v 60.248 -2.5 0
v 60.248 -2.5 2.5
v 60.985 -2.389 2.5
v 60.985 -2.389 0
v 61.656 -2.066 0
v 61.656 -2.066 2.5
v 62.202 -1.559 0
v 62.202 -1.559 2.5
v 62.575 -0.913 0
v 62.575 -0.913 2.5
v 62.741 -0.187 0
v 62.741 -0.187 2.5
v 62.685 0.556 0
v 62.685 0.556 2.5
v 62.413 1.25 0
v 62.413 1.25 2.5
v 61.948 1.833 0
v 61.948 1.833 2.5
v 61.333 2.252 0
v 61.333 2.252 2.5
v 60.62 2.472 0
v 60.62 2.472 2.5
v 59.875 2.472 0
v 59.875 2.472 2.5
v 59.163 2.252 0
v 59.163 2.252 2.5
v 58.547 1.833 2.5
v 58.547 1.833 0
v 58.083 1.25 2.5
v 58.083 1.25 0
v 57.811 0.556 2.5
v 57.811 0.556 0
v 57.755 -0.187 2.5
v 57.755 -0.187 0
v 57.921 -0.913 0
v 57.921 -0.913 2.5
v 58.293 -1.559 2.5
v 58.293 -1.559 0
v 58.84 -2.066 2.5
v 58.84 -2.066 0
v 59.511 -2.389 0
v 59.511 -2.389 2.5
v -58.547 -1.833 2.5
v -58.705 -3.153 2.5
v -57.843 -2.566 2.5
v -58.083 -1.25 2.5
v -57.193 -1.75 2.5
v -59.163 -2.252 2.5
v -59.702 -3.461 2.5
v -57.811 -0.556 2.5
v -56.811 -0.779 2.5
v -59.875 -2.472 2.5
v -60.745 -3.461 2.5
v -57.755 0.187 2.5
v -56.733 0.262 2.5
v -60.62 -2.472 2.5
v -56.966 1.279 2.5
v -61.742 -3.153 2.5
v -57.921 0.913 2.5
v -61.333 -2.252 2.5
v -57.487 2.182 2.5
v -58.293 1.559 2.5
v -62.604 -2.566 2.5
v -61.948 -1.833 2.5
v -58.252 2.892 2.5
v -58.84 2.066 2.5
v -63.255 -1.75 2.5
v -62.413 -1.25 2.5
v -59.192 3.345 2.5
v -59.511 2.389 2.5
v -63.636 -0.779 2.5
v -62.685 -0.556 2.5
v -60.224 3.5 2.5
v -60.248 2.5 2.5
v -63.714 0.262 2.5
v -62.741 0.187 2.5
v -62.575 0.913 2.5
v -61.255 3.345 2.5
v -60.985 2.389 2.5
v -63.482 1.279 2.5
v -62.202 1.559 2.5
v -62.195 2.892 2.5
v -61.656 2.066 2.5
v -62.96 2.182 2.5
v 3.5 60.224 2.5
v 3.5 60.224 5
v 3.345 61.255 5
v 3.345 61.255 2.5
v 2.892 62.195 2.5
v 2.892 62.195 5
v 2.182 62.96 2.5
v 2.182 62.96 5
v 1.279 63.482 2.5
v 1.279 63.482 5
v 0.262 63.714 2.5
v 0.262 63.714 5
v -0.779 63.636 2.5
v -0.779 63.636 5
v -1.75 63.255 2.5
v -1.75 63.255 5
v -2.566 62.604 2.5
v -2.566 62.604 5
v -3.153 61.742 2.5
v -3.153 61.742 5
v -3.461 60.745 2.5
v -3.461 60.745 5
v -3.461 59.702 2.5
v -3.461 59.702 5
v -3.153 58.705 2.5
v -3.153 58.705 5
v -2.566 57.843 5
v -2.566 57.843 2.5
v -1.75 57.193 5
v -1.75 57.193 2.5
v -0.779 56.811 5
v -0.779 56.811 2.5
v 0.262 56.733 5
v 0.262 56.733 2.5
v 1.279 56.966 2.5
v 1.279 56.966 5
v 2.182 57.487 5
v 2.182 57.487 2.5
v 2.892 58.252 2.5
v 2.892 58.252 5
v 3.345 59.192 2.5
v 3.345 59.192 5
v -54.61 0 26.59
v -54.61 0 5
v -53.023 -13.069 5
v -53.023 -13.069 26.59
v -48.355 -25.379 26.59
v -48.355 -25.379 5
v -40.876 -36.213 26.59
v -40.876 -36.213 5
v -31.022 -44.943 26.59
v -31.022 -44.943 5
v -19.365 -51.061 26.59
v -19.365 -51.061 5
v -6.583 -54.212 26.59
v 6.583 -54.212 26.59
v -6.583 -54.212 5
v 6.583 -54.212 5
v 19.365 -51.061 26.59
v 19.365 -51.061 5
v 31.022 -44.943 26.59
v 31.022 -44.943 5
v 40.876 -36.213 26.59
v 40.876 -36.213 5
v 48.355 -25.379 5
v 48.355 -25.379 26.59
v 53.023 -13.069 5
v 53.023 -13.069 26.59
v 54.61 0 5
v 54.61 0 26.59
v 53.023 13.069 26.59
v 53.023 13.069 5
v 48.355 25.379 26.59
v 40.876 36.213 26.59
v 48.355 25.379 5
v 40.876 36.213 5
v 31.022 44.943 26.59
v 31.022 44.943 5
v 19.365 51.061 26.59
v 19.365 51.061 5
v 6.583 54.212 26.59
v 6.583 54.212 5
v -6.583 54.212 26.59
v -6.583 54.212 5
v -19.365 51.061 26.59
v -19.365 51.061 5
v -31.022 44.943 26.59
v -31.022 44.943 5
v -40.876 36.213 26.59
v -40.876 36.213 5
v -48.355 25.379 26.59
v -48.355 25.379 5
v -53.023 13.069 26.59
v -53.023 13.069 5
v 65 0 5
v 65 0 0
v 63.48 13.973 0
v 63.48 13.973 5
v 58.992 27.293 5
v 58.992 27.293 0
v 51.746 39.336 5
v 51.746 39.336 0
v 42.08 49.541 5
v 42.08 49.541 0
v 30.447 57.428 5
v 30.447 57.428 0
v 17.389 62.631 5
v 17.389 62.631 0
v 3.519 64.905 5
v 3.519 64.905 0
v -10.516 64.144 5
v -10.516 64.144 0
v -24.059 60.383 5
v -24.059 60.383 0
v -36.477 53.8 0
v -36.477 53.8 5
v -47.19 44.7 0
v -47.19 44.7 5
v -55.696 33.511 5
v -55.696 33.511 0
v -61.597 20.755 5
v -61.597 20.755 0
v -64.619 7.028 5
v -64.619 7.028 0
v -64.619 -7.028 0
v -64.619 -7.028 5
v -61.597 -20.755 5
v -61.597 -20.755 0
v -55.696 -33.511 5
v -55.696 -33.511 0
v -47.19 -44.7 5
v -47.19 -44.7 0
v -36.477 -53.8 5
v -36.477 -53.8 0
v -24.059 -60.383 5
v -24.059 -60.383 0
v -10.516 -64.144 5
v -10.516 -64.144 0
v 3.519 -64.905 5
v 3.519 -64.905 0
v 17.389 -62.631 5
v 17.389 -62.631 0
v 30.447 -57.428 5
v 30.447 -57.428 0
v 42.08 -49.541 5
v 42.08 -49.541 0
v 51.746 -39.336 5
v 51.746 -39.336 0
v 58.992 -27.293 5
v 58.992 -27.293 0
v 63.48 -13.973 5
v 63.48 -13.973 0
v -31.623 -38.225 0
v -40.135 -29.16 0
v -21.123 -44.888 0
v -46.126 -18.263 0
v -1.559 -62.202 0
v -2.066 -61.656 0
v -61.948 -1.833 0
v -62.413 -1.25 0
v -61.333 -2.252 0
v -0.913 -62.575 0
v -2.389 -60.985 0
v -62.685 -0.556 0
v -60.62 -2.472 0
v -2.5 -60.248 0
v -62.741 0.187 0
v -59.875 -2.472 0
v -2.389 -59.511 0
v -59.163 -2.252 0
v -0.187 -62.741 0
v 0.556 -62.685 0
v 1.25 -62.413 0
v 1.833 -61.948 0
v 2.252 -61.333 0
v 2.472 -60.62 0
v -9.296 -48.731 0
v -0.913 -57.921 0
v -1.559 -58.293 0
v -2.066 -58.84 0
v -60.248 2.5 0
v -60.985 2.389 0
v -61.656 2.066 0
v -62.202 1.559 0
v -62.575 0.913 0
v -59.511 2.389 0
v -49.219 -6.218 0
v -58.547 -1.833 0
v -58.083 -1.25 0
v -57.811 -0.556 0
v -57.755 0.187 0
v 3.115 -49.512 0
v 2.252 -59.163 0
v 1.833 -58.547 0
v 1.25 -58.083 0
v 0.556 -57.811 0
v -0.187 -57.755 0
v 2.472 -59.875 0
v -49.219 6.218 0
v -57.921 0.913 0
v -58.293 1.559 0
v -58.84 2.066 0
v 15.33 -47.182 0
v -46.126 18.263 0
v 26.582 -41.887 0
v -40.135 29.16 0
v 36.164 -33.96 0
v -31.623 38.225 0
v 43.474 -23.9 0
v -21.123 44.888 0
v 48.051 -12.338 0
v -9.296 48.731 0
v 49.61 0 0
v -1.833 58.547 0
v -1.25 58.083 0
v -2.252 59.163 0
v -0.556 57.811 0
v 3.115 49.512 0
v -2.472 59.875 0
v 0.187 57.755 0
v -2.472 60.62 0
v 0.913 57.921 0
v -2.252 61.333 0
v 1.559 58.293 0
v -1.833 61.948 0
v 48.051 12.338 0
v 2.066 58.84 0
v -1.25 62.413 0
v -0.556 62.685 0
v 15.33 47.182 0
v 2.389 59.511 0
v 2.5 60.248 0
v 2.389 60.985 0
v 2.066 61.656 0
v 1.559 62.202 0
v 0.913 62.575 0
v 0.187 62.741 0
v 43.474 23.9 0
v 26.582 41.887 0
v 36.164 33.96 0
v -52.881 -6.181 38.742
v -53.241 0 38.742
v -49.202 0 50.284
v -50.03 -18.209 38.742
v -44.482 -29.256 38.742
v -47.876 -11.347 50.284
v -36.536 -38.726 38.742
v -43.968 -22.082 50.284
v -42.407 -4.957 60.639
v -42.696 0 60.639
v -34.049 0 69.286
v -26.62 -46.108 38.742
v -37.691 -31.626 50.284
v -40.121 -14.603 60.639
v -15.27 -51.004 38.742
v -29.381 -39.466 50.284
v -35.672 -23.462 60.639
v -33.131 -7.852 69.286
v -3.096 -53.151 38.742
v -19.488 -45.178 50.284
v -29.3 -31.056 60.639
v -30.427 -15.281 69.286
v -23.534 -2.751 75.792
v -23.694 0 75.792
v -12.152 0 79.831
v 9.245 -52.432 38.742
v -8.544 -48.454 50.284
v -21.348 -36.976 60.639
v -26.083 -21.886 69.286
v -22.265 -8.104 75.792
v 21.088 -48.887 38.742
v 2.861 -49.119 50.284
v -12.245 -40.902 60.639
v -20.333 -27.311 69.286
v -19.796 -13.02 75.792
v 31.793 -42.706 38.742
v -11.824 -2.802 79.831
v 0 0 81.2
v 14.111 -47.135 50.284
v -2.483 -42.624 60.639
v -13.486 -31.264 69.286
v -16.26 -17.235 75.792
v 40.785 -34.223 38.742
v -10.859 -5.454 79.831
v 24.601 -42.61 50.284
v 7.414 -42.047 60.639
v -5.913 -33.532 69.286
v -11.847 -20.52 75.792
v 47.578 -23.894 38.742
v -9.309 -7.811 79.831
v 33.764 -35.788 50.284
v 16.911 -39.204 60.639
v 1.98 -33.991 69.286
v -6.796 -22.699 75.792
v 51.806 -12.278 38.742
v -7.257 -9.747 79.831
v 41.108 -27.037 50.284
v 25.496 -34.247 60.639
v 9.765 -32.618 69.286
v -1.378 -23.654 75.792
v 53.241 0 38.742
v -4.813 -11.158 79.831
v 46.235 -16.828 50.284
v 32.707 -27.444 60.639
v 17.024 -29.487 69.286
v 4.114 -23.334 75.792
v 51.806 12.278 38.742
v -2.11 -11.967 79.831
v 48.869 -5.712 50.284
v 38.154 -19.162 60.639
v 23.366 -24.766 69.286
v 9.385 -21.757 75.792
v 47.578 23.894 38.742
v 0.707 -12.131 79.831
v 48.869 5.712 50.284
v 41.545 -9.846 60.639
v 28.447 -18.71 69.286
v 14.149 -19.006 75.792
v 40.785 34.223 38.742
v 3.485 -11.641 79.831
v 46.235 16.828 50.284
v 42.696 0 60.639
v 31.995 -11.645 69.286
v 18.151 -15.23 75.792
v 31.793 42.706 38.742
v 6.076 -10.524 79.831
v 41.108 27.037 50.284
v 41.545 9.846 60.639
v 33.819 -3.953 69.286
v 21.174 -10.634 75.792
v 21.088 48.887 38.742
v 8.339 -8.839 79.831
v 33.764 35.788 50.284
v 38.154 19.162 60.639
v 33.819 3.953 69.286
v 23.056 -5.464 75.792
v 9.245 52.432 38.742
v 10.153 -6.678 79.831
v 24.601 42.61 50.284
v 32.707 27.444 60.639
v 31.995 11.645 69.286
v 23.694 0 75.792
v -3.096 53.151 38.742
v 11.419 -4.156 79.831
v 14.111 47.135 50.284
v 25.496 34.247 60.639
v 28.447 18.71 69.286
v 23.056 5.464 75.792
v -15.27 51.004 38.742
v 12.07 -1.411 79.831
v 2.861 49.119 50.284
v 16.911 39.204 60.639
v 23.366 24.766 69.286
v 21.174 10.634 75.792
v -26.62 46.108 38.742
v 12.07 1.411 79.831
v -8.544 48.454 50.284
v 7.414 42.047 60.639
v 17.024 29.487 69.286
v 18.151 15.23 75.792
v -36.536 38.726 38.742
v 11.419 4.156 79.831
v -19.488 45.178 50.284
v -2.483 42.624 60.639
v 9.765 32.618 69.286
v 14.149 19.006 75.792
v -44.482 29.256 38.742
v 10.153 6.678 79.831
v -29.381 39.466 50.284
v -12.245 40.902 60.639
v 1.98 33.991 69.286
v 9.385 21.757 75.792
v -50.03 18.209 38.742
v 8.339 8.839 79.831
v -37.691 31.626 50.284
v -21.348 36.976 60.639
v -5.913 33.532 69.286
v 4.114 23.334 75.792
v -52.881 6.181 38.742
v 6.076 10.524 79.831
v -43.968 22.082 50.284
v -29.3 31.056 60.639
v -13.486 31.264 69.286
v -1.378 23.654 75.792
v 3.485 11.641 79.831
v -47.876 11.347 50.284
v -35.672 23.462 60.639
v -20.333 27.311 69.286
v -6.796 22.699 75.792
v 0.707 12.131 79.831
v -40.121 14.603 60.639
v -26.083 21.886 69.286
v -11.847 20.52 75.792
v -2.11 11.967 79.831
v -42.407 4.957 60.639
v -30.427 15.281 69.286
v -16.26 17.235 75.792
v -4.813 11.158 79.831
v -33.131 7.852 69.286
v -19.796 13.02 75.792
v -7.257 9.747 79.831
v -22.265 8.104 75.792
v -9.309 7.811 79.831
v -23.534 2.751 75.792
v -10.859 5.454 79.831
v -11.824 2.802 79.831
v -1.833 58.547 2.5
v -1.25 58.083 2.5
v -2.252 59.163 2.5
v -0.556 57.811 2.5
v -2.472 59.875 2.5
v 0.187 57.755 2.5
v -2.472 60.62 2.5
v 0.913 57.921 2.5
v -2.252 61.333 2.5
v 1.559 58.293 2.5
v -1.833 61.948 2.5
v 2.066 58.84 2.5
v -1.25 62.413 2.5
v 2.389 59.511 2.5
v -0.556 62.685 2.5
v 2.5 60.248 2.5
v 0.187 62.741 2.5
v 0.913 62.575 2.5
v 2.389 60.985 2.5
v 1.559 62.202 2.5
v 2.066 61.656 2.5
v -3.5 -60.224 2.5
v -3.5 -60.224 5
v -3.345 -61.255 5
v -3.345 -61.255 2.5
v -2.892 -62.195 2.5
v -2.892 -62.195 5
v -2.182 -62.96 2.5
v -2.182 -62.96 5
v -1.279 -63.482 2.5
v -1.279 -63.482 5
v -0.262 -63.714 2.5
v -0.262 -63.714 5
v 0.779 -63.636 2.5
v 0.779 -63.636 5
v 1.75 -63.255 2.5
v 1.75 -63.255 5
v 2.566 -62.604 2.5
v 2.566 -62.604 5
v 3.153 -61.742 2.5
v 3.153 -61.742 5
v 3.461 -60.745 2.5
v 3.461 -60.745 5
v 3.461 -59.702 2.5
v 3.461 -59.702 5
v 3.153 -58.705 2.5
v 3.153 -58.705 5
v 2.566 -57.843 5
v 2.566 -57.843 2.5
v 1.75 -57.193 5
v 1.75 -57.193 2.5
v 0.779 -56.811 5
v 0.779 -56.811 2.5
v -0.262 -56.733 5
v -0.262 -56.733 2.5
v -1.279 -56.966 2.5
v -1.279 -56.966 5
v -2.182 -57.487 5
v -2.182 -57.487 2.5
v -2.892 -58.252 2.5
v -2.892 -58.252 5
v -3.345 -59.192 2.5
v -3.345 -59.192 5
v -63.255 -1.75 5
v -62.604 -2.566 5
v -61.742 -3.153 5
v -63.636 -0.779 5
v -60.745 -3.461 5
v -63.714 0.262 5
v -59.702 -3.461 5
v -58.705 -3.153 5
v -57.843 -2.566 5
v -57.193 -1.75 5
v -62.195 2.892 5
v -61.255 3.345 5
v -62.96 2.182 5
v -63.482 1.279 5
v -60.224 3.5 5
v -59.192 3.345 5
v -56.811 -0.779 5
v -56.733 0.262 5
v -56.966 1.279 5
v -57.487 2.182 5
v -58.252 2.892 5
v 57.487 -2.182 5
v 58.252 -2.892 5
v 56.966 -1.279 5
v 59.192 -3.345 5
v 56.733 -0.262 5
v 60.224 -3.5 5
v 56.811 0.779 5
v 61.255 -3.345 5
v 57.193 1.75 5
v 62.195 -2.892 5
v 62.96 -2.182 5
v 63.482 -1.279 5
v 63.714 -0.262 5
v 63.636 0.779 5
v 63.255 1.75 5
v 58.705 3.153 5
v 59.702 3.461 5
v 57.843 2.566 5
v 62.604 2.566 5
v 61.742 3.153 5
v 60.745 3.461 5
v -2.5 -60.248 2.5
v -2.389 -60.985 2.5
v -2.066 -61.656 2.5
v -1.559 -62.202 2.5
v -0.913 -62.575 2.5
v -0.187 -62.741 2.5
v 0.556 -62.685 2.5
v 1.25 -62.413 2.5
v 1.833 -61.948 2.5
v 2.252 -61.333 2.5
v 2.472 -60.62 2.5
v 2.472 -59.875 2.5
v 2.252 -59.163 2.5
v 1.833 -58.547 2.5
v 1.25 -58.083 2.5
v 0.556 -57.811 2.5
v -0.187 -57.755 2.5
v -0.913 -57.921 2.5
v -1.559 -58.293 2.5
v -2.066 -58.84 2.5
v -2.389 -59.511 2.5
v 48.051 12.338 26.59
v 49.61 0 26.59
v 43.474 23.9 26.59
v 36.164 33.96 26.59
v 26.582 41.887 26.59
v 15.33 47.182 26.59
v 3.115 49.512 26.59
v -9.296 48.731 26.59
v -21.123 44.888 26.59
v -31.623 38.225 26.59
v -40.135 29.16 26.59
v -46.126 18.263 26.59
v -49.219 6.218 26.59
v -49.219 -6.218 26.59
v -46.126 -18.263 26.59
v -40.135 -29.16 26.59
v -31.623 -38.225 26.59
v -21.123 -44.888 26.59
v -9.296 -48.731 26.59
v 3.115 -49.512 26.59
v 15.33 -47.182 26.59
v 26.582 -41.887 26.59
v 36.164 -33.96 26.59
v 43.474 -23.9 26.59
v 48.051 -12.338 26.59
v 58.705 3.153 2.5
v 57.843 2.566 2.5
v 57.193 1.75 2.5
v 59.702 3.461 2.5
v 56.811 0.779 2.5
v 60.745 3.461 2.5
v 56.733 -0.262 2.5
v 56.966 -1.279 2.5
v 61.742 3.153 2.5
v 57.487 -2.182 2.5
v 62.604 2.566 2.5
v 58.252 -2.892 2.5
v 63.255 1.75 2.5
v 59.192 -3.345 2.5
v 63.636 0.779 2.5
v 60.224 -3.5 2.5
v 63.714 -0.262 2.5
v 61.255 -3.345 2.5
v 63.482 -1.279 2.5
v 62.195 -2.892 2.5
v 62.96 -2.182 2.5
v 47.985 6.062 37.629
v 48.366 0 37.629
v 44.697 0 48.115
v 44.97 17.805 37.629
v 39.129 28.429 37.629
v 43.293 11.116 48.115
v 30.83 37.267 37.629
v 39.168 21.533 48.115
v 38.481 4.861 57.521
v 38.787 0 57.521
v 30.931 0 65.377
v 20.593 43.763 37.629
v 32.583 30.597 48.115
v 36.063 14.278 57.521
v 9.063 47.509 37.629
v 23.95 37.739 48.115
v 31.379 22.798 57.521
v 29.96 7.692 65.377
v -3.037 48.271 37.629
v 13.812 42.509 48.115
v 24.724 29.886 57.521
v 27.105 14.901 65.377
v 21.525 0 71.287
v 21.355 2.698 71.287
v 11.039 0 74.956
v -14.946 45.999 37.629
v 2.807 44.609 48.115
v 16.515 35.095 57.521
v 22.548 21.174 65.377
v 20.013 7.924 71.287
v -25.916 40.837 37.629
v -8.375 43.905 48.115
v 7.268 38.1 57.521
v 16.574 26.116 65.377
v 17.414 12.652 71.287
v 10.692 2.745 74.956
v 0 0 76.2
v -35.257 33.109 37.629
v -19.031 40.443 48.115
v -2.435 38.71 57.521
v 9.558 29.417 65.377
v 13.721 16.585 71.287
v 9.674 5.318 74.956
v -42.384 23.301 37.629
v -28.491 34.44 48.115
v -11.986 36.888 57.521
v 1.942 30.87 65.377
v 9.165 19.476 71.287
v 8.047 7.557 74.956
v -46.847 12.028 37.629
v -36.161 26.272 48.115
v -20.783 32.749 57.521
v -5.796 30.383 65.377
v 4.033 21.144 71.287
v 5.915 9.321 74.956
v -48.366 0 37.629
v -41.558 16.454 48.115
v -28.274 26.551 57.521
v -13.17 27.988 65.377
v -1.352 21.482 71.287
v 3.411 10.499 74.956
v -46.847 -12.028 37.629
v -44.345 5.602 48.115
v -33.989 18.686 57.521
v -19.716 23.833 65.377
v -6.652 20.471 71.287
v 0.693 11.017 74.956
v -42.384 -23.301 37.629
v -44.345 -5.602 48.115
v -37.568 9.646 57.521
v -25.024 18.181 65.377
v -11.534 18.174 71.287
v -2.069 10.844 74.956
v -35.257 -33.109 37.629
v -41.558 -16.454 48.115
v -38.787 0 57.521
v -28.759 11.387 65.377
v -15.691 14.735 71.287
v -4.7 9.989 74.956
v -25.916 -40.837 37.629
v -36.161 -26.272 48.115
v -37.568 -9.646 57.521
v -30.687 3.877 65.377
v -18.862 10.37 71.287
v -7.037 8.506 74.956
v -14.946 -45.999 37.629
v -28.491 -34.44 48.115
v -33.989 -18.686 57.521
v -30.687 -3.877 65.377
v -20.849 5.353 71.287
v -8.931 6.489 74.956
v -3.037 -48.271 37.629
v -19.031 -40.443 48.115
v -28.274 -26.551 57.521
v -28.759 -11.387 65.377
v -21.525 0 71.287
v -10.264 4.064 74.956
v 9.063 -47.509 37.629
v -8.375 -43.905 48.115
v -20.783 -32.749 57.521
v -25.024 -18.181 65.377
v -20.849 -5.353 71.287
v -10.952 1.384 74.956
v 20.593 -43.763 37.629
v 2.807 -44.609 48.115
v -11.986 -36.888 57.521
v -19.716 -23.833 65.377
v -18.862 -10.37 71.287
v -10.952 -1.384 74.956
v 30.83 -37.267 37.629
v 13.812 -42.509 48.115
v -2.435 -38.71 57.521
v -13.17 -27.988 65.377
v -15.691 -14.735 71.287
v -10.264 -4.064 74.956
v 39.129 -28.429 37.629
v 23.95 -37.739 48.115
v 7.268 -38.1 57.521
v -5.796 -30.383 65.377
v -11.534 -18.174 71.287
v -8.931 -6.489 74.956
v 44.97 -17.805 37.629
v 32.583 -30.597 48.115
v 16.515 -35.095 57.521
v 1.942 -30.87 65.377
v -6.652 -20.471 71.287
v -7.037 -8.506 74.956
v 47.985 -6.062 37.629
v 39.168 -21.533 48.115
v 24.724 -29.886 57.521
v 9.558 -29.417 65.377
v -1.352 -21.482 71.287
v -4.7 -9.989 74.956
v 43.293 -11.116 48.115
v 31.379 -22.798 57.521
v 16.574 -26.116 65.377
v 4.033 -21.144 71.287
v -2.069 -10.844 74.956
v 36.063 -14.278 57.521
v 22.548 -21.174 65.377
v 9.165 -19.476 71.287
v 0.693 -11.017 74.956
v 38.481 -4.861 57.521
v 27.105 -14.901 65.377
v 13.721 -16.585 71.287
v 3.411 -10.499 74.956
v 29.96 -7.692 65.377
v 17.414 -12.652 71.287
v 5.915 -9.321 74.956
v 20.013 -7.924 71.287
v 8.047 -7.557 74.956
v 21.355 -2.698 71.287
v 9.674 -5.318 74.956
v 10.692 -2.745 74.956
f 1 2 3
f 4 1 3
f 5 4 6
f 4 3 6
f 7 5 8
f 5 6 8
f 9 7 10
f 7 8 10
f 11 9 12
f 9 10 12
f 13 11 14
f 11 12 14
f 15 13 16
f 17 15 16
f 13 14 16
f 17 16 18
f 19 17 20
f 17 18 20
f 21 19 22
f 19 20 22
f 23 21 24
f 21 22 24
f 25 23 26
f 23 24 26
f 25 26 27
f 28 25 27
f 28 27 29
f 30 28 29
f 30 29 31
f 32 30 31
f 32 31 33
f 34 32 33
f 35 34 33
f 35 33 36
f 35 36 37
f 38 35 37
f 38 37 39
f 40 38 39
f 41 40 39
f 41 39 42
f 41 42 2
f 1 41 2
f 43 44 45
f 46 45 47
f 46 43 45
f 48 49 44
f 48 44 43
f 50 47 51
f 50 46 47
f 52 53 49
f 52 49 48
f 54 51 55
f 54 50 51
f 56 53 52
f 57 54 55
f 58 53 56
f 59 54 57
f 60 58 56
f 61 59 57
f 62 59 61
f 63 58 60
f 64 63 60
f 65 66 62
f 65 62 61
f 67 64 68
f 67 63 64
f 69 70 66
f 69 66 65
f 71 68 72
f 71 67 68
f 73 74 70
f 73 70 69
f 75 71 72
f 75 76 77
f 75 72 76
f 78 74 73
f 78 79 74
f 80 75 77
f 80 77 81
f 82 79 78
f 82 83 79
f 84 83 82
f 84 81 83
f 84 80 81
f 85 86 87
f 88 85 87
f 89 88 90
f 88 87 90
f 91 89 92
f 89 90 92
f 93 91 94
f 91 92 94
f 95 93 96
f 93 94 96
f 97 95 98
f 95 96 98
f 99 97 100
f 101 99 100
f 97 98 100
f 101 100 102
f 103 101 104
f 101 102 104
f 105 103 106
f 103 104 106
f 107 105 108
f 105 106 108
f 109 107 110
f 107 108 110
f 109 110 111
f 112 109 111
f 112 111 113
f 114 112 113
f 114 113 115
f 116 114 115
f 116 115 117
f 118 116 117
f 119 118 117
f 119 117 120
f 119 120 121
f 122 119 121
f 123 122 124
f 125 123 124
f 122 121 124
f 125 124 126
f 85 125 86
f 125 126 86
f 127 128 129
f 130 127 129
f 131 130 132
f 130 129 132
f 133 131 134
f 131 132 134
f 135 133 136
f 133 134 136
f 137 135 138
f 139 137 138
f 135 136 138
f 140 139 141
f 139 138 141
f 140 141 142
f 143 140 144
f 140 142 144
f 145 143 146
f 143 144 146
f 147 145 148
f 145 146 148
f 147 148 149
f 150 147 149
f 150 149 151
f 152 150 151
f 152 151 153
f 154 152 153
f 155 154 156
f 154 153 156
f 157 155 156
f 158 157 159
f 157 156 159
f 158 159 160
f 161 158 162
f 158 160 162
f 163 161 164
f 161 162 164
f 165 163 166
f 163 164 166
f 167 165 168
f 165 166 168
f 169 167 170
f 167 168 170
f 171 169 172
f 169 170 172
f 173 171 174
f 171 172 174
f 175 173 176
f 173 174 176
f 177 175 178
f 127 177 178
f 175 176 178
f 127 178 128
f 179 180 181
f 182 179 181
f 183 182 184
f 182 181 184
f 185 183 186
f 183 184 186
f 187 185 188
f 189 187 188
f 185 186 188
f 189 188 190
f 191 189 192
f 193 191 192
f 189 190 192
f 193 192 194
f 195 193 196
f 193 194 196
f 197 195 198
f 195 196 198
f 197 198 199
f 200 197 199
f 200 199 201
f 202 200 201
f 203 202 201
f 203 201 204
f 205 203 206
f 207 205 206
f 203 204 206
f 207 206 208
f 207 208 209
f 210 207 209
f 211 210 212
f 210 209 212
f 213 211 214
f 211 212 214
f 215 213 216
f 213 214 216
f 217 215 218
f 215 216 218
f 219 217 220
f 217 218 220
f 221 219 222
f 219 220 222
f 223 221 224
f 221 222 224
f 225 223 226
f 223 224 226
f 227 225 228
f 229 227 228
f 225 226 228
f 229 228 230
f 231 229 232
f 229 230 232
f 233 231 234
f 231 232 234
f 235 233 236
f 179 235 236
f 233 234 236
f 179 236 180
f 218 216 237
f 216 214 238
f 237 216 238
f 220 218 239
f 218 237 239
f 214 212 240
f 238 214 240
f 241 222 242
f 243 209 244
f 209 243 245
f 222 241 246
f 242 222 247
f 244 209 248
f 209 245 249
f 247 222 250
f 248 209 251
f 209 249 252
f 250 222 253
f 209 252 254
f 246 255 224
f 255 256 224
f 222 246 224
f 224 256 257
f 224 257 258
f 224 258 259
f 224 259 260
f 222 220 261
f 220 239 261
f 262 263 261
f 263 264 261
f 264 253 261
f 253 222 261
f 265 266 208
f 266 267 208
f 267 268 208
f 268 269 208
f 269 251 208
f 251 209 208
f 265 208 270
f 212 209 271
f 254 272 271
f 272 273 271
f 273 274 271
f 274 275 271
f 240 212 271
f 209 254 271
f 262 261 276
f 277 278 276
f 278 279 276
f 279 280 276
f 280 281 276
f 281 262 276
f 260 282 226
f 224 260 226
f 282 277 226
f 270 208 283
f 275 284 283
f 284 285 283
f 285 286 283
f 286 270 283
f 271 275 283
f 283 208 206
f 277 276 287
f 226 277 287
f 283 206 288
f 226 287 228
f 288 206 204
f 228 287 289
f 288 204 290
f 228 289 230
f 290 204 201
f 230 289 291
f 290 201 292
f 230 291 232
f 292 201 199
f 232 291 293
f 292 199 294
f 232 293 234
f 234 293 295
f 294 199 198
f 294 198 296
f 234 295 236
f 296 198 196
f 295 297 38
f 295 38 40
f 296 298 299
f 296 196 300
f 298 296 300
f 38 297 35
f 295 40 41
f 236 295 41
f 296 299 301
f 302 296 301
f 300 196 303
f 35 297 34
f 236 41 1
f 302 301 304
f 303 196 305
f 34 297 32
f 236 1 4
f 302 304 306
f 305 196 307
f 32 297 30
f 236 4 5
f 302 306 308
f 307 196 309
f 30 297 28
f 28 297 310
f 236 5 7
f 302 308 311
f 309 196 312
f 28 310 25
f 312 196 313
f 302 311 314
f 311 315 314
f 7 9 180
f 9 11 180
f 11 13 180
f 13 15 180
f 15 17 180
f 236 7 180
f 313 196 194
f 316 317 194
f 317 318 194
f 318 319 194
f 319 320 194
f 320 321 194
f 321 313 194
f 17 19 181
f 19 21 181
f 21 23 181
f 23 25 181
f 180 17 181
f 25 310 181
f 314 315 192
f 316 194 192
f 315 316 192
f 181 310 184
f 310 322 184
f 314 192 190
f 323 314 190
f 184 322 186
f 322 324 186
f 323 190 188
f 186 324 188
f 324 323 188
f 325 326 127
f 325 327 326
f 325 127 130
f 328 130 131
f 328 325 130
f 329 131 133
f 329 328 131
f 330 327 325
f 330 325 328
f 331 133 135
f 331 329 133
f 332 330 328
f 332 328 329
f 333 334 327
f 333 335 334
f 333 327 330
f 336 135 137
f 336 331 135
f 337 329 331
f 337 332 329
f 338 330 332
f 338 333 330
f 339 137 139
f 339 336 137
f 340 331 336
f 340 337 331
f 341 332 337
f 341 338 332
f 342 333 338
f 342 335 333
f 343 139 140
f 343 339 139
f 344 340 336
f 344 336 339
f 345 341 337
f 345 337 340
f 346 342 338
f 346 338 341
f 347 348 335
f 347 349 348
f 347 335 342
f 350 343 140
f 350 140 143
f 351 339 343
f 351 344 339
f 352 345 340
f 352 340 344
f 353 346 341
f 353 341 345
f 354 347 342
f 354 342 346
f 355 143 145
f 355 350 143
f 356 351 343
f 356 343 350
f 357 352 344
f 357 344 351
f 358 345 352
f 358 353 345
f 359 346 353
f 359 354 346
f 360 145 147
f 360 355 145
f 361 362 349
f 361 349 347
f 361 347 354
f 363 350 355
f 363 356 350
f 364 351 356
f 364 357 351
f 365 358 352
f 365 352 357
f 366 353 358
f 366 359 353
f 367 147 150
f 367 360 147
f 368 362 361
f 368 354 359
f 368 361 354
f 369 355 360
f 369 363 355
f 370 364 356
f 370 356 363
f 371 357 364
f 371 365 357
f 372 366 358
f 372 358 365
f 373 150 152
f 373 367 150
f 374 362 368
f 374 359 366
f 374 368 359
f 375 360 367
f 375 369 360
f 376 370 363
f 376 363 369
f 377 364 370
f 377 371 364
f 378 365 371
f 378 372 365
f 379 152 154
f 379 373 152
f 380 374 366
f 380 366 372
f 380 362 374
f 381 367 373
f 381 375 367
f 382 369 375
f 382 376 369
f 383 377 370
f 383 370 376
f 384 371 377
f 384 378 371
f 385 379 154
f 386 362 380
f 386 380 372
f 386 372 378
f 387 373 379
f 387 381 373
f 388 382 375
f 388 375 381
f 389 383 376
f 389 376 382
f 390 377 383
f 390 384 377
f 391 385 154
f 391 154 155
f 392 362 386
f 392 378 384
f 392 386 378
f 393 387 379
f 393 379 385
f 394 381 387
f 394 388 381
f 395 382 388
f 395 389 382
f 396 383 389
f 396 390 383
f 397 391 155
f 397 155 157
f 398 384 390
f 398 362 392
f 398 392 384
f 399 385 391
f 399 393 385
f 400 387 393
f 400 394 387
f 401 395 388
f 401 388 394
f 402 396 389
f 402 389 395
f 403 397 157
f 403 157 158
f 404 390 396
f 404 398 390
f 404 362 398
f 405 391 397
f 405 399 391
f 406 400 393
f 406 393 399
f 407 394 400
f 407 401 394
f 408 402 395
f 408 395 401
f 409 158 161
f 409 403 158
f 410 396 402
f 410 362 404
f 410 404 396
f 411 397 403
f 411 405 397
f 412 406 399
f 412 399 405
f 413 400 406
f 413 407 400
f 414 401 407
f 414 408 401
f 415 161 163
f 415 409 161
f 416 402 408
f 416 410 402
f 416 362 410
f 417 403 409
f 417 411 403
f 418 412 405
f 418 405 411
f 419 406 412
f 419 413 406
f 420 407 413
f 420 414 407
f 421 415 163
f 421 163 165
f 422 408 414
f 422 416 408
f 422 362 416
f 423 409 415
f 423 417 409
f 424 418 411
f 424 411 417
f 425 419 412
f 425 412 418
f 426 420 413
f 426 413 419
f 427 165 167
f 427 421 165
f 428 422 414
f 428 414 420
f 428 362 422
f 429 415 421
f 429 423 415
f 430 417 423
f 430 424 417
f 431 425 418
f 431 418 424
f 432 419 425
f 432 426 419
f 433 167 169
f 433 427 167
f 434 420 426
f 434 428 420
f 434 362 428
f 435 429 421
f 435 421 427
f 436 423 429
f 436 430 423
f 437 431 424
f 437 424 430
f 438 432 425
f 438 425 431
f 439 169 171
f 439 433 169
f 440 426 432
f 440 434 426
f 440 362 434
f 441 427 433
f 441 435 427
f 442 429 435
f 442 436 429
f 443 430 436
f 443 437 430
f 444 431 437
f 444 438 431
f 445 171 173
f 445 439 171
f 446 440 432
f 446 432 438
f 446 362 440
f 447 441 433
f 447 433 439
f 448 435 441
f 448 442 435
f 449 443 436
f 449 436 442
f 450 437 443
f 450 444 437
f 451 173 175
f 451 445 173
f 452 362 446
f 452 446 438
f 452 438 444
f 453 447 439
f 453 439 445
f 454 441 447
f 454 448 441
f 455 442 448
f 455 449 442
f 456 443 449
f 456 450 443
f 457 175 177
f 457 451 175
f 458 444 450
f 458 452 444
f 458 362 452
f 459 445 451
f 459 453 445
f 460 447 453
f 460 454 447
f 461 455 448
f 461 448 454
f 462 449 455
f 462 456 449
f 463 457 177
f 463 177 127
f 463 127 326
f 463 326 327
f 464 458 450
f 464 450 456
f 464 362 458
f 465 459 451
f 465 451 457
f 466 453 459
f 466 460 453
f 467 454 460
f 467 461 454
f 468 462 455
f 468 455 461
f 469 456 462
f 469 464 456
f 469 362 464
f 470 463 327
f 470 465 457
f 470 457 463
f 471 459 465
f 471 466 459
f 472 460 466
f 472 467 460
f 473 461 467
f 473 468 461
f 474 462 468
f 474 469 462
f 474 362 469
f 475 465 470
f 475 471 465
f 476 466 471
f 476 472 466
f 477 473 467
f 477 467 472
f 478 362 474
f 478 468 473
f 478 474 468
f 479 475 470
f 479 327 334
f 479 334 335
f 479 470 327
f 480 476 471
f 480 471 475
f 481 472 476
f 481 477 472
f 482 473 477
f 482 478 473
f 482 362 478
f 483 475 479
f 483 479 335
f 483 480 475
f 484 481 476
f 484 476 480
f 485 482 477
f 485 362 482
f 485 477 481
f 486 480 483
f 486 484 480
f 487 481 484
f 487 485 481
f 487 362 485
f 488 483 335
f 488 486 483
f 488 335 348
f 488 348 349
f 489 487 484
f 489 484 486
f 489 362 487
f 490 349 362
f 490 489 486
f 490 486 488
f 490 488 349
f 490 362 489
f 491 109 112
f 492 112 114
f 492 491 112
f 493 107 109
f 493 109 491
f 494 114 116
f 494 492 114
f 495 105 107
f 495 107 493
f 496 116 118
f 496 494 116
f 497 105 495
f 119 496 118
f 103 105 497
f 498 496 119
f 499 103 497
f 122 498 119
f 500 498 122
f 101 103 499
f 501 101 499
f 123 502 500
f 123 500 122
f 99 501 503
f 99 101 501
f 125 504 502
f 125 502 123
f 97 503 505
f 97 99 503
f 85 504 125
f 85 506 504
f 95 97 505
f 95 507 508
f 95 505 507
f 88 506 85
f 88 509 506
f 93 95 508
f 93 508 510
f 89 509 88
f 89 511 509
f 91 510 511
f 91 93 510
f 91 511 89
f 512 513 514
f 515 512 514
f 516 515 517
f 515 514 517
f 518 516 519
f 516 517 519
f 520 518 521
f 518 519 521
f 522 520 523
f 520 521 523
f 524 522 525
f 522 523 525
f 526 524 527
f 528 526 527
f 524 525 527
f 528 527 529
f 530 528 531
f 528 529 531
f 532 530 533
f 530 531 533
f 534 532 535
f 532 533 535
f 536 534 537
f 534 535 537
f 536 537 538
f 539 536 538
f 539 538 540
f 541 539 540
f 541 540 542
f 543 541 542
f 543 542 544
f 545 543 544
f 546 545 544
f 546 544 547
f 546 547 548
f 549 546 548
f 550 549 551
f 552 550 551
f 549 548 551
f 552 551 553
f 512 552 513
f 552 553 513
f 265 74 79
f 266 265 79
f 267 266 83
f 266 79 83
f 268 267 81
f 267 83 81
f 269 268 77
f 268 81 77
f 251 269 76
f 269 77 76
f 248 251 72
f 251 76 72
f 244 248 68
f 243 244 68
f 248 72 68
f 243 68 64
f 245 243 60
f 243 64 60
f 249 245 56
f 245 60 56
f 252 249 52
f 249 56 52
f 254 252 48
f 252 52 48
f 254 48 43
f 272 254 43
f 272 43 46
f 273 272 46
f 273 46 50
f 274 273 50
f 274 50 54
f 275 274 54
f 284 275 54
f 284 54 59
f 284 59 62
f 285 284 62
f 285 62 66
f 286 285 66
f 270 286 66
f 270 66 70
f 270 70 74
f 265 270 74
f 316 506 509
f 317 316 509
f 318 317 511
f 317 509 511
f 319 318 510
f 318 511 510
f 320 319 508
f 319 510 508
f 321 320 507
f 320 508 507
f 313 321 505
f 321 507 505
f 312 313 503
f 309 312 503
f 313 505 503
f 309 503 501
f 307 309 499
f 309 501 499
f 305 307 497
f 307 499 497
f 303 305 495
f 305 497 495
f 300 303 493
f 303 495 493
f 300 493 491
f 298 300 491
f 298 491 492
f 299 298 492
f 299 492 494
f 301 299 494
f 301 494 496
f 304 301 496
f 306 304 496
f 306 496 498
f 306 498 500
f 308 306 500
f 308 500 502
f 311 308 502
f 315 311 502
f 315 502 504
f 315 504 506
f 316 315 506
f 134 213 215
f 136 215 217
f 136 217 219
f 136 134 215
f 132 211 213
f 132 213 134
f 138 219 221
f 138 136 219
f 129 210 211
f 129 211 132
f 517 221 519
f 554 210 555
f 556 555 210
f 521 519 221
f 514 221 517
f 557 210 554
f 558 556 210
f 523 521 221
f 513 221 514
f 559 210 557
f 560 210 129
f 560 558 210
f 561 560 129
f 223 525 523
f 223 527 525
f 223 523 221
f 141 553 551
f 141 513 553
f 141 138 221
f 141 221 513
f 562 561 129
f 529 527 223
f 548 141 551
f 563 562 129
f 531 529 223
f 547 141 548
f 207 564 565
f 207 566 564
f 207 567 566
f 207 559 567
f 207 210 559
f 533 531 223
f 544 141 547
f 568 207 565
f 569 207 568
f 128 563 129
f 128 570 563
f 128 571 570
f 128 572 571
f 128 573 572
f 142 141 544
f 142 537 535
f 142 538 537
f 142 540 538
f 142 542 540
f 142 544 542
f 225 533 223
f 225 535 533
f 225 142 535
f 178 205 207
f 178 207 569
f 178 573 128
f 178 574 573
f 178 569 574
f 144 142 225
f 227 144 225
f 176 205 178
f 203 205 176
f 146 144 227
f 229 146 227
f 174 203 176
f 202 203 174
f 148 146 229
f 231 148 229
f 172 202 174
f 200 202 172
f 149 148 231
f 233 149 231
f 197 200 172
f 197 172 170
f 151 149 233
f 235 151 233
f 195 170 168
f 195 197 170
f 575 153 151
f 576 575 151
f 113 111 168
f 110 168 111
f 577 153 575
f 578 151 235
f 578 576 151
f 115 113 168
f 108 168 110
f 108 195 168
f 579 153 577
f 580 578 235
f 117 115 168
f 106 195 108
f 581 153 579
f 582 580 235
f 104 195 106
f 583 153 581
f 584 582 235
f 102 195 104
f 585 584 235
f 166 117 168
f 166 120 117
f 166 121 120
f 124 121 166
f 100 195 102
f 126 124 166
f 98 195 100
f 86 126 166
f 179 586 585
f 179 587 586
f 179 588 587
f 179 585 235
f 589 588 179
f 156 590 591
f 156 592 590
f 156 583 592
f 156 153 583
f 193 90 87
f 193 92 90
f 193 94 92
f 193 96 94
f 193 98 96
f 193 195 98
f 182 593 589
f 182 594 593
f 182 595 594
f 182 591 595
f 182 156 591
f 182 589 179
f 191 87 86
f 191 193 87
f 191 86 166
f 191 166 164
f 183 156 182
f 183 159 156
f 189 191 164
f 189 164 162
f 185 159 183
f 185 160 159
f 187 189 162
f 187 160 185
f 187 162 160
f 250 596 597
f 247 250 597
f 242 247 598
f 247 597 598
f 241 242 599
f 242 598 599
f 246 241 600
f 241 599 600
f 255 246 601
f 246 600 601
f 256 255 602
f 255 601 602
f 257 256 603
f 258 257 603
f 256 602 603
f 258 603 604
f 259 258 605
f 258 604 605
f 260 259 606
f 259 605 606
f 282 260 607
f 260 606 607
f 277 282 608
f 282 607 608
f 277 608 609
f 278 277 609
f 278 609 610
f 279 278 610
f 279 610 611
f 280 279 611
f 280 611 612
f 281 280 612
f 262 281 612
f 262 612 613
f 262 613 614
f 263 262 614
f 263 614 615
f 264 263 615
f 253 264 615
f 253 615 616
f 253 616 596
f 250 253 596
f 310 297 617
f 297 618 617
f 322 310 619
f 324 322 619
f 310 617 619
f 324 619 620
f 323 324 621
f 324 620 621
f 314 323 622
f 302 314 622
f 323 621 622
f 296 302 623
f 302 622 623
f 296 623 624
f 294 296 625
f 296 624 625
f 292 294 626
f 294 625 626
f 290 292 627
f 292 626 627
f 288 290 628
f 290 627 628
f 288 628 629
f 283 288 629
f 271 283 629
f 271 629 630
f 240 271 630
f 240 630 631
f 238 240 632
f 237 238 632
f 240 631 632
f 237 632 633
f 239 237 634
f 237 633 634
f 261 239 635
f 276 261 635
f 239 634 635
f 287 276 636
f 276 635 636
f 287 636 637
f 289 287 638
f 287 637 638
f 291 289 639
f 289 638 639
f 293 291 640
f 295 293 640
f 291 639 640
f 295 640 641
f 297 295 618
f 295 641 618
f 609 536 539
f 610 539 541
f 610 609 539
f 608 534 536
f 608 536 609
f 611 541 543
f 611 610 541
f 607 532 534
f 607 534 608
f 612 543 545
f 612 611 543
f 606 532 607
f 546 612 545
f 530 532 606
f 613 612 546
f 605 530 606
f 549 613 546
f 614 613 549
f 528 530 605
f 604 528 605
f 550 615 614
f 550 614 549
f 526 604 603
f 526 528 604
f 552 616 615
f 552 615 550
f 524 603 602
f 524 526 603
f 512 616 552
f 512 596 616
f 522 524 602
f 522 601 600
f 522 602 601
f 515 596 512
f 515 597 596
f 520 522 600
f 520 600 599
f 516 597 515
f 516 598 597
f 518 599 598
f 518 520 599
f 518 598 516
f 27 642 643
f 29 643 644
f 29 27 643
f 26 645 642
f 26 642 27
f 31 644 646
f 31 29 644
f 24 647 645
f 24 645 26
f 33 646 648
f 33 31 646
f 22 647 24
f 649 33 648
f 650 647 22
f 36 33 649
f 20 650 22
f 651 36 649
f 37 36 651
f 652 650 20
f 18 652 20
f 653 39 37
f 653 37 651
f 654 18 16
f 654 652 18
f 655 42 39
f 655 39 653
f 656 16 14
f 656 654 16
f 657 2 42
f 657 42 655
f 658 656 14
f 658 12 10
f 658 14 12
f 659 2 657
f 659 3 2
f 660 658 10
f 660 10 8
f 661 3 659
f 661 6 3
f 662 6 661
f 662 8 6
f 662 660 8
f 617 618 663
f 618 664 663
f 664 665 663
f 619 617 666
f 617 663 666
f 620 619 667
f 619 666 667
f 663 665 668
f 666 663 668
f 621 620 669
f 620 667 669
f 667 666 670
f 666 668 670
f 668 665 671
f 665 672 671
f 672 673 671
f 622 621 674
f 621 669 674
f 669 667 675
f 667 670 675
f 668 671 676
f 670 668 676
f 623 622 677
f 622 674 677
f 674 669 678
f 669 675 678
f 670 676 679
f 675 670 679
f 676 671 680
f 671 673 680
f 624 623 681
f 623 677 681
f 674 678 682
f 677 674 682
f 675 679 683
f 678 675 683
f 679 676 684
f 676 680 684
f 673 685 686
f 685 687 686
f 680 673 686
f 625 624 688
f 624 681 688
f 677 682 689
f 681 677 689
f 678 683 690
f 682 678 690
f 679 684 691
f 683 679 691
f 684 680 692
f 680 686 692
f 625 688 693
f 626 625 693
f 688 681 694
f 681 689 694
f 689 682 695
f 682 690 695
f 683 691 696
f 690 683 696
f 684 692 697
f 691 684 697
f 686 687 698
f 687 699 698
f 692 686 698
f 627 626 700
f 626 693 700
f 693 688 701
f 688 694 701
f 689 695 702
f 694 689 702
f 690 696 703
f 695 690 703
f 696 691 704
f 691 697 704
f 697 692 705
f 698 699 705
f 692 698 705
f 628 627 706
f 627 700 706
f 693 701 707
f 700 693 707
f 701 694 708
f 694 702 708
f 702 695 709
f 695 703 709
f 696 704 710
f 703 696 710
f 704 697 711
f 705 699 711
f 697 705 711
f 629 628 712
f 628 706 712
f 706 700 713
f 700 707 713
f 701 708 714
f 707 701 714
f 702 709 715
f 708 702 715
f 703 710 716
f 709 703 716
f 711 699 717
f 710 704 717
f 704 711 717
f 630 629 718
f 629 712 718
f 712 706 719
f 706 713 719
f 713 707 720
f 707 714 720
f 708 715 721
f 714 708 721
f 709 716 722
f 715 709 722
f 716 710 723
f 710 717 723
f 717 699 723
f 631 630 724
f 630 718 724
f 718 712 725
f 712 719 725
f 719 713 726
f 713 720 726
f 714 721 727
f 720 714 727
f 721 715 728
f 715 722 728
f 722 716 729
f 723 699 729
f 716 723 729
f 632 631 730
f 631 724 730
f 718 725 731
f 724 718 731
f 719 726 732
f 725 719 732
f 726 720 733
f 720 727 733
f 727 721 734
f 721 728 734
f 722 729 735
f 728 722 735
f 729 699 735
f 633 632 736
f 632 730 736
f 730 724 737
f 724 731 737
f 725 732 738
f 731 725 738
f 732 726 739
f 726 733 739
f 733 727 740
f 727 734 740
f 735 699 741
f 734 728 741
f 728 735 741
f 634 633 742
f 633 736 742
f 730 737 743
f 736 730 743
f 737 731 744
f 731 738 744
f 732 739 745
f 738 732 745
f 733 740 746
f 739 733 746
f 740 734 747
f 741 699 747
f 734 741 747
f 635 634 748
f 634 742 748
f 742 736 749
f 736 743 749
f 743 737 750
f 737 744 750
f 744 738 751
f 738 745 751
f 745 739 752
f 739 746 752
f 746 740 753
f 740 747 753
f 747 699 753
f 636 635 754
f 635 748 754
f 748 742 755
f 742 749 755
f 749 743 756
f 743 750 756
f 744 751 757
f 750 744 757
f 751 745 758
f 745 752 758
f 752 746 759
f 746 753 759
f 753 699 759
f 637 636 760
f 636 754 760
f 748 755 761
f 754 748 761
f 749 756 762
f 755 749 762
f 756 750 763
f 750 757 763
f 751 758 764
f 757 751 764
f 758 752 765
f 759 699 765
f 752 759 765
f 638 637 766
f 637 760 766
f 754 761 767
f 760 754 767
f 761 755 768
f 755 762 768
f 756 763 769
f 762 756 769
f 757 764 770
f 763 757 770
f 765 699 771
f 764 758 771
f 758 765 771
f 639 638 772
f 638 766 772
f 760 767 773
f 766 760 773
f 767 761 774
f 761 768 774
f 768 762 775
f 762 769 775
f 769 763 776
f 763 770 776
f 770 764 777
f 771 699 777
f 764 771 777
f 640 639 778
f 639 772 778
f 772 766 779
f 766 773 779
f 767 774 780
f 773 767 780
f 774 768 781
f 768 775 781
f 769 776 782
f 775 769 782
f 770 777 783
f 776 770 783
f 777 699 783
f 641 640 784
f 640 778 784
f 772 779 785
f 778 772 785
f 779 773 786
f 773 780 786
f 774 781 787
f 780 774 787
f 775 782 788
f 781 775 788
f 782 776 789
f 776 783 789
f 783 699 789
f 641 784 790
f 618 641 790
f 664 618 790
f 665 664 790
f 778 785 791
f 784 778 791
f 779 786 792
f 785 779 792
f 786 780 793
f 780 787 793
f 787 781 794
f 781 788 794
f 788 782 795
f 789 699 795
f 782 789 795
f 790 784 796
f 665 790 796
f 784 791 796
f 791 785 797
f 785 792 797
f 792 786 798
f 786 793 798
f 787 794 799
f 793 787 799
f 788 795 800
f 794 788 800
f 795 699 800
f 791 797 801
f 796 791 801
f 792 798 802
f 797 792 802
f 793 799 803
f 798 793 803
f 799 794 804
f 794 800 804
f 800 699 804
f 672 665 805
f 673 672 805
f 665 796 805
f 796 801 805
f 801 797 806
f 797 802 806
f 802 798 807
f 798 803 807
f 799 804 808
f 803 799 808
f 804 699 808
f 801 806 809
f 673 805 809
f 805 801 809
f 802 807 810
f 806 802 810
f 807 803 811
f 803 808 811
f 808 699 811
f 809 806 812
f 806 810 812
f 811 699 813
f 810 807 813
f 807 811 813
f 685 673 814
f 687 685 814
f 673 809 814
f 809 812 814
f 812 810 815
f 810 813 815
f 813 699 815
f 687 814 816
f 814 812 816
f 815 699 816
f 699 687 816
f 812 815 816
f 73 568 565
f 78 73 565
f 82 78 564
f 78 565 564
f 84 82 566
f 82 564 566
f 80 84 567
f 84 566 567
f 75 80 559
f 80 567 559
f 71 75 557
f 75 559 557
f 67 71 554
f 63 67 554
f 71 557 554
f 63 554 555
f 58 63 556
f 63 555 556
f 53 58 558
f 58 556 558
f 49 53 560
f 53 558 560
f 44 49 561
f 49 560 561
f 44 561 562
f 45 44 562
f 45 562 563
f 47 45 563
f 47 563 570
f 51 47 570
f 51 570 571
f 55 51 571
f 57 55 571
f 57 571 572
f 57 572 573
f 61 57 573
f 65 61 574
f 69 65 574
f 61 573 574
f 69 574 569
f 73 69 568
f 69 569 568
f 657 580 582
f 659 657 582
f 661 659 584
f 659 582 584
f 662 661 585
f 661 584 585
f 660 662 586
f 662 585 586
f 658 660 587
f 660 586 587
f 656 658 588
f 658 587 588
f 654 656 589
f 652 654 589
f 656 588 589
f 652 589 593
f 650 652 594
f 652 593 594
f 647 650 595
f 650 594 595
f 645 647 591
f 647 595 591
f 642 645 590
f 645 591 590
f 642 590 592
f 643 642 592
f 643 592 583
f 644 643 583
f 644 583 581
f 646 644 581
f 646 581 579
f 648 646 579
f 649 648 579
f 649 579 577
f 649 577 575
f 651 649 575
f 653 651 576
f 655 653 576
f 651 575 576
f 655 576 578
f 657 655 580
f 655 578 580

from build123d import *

# Parameters (mm, degrees)
SKETCH2_R           = 65
BOSS_EXTRUDE1_DEPTH = 5
SKETCH3_R           = 54.61
BOSS_EXTRUDE2_DEPTH = 76.2
FILLET8_R           = 54.61
SKETCH7_R           = 2.5
CUT_EXTRUDE2_DEPTH  = 5
SKETCH8_R           = 3.5
CUT_EXTRUDE3_DEPTH  = 2.5
CIRPATTERN1_COUNT   = 4


# Read off the part's stored shape, not the designer's step: Shell1
with BuildPart() as part:
    # Sketch2 → Boss-Extrude1 (new body)
    with BuildSketch(Plane(origin=(0, 0, 0), x_dir=(0, 1, 0), z_dir=(0, 0, 1))):
        with Locations(Location((0, 0, 0), (0, 0, 270))):
            Circle(SKETCH2_R)
    extrude(amount=BOSS_EXTRUDE1_DEPTH)

    # Sketch3 → Boss-Extrude2 (add)
    with BuildSketch(Plane.XY.offset(5)):
        with Locations(Location((0, 0, 0), (0, 0, 180))):
            Circle(SKETCH3_R)
    extrude(amount=BOSS_EXTRUDE2_DEPTH)

    # Fillet8
    fillet8_edges = [part.edges().sort_by_distance(p)[0] for p in [
        (54.61, 0, 81.2),
    ]]
    fillet(fillet8_edges, radius=FILLET8_R)

    # Shell1 outline → Shell1 (revolve, cut)
    with BuildSketch(Plane.XZ):
        with BuildLine():
            Line((49.61, 0), (49.61, 26.58999995))
            ThreePointArc((49.61, 26.58999995), (35.079567432, 61.669567397), (0, 76.2))
            Line((0, 76.2), (0, 0))
            Line((0, 0), (49.61, 0))
        make_face()
    revolve(axis=Axis((0, 0, 0), (0, 0, 1)), mode=Mode.SUBTRACT)

    # Sketch7 → Cut-Extrude2 (cut)
    with BuildSketch(Plane.XY.offset(5)):
        with Locations((0, 60.247846794)):
            Circle(SKETCH7_R)
    cut_extrude2 = extrude(amount=-CUT_EXTRUDE2_DEPTH, mode=Mode.SUBTRACT)

    # Sketch8 → Cut-Extrude3 (cut)
    with BuildSketch(Plane.XY.offset(5)):
        with Locations((0, 60.223600104)):
            Circle(SKETCH8_R)
    cut_extrude3 = extrude(amount=-CUT_EXTRUDE3_DEPTH, mode=Mode.SUBTRACT)

    # CirPattern1: Cut-Extrude2, Cut-Extrude3 ×4 about axis
    cirpattern1_axis = Axis((0, 0, 0), (0, 0, 1))
    add([cut_extrude2.rotate(cirpattern1_axis, i * 360 / CIRPATTERN1_COUNT) for i in range(1, CIRPATTERN1_COUNT)], mode=Mode.SUBTRACT)
    add([cut_extrude3.rotate(cirpattern1_axis, i * 360 / CIRPATTERN1_COUNT) for i in range(1, CIRPATTERN1_COUNT)], mode=Mode.SUBTRACT)


solid = part.part
